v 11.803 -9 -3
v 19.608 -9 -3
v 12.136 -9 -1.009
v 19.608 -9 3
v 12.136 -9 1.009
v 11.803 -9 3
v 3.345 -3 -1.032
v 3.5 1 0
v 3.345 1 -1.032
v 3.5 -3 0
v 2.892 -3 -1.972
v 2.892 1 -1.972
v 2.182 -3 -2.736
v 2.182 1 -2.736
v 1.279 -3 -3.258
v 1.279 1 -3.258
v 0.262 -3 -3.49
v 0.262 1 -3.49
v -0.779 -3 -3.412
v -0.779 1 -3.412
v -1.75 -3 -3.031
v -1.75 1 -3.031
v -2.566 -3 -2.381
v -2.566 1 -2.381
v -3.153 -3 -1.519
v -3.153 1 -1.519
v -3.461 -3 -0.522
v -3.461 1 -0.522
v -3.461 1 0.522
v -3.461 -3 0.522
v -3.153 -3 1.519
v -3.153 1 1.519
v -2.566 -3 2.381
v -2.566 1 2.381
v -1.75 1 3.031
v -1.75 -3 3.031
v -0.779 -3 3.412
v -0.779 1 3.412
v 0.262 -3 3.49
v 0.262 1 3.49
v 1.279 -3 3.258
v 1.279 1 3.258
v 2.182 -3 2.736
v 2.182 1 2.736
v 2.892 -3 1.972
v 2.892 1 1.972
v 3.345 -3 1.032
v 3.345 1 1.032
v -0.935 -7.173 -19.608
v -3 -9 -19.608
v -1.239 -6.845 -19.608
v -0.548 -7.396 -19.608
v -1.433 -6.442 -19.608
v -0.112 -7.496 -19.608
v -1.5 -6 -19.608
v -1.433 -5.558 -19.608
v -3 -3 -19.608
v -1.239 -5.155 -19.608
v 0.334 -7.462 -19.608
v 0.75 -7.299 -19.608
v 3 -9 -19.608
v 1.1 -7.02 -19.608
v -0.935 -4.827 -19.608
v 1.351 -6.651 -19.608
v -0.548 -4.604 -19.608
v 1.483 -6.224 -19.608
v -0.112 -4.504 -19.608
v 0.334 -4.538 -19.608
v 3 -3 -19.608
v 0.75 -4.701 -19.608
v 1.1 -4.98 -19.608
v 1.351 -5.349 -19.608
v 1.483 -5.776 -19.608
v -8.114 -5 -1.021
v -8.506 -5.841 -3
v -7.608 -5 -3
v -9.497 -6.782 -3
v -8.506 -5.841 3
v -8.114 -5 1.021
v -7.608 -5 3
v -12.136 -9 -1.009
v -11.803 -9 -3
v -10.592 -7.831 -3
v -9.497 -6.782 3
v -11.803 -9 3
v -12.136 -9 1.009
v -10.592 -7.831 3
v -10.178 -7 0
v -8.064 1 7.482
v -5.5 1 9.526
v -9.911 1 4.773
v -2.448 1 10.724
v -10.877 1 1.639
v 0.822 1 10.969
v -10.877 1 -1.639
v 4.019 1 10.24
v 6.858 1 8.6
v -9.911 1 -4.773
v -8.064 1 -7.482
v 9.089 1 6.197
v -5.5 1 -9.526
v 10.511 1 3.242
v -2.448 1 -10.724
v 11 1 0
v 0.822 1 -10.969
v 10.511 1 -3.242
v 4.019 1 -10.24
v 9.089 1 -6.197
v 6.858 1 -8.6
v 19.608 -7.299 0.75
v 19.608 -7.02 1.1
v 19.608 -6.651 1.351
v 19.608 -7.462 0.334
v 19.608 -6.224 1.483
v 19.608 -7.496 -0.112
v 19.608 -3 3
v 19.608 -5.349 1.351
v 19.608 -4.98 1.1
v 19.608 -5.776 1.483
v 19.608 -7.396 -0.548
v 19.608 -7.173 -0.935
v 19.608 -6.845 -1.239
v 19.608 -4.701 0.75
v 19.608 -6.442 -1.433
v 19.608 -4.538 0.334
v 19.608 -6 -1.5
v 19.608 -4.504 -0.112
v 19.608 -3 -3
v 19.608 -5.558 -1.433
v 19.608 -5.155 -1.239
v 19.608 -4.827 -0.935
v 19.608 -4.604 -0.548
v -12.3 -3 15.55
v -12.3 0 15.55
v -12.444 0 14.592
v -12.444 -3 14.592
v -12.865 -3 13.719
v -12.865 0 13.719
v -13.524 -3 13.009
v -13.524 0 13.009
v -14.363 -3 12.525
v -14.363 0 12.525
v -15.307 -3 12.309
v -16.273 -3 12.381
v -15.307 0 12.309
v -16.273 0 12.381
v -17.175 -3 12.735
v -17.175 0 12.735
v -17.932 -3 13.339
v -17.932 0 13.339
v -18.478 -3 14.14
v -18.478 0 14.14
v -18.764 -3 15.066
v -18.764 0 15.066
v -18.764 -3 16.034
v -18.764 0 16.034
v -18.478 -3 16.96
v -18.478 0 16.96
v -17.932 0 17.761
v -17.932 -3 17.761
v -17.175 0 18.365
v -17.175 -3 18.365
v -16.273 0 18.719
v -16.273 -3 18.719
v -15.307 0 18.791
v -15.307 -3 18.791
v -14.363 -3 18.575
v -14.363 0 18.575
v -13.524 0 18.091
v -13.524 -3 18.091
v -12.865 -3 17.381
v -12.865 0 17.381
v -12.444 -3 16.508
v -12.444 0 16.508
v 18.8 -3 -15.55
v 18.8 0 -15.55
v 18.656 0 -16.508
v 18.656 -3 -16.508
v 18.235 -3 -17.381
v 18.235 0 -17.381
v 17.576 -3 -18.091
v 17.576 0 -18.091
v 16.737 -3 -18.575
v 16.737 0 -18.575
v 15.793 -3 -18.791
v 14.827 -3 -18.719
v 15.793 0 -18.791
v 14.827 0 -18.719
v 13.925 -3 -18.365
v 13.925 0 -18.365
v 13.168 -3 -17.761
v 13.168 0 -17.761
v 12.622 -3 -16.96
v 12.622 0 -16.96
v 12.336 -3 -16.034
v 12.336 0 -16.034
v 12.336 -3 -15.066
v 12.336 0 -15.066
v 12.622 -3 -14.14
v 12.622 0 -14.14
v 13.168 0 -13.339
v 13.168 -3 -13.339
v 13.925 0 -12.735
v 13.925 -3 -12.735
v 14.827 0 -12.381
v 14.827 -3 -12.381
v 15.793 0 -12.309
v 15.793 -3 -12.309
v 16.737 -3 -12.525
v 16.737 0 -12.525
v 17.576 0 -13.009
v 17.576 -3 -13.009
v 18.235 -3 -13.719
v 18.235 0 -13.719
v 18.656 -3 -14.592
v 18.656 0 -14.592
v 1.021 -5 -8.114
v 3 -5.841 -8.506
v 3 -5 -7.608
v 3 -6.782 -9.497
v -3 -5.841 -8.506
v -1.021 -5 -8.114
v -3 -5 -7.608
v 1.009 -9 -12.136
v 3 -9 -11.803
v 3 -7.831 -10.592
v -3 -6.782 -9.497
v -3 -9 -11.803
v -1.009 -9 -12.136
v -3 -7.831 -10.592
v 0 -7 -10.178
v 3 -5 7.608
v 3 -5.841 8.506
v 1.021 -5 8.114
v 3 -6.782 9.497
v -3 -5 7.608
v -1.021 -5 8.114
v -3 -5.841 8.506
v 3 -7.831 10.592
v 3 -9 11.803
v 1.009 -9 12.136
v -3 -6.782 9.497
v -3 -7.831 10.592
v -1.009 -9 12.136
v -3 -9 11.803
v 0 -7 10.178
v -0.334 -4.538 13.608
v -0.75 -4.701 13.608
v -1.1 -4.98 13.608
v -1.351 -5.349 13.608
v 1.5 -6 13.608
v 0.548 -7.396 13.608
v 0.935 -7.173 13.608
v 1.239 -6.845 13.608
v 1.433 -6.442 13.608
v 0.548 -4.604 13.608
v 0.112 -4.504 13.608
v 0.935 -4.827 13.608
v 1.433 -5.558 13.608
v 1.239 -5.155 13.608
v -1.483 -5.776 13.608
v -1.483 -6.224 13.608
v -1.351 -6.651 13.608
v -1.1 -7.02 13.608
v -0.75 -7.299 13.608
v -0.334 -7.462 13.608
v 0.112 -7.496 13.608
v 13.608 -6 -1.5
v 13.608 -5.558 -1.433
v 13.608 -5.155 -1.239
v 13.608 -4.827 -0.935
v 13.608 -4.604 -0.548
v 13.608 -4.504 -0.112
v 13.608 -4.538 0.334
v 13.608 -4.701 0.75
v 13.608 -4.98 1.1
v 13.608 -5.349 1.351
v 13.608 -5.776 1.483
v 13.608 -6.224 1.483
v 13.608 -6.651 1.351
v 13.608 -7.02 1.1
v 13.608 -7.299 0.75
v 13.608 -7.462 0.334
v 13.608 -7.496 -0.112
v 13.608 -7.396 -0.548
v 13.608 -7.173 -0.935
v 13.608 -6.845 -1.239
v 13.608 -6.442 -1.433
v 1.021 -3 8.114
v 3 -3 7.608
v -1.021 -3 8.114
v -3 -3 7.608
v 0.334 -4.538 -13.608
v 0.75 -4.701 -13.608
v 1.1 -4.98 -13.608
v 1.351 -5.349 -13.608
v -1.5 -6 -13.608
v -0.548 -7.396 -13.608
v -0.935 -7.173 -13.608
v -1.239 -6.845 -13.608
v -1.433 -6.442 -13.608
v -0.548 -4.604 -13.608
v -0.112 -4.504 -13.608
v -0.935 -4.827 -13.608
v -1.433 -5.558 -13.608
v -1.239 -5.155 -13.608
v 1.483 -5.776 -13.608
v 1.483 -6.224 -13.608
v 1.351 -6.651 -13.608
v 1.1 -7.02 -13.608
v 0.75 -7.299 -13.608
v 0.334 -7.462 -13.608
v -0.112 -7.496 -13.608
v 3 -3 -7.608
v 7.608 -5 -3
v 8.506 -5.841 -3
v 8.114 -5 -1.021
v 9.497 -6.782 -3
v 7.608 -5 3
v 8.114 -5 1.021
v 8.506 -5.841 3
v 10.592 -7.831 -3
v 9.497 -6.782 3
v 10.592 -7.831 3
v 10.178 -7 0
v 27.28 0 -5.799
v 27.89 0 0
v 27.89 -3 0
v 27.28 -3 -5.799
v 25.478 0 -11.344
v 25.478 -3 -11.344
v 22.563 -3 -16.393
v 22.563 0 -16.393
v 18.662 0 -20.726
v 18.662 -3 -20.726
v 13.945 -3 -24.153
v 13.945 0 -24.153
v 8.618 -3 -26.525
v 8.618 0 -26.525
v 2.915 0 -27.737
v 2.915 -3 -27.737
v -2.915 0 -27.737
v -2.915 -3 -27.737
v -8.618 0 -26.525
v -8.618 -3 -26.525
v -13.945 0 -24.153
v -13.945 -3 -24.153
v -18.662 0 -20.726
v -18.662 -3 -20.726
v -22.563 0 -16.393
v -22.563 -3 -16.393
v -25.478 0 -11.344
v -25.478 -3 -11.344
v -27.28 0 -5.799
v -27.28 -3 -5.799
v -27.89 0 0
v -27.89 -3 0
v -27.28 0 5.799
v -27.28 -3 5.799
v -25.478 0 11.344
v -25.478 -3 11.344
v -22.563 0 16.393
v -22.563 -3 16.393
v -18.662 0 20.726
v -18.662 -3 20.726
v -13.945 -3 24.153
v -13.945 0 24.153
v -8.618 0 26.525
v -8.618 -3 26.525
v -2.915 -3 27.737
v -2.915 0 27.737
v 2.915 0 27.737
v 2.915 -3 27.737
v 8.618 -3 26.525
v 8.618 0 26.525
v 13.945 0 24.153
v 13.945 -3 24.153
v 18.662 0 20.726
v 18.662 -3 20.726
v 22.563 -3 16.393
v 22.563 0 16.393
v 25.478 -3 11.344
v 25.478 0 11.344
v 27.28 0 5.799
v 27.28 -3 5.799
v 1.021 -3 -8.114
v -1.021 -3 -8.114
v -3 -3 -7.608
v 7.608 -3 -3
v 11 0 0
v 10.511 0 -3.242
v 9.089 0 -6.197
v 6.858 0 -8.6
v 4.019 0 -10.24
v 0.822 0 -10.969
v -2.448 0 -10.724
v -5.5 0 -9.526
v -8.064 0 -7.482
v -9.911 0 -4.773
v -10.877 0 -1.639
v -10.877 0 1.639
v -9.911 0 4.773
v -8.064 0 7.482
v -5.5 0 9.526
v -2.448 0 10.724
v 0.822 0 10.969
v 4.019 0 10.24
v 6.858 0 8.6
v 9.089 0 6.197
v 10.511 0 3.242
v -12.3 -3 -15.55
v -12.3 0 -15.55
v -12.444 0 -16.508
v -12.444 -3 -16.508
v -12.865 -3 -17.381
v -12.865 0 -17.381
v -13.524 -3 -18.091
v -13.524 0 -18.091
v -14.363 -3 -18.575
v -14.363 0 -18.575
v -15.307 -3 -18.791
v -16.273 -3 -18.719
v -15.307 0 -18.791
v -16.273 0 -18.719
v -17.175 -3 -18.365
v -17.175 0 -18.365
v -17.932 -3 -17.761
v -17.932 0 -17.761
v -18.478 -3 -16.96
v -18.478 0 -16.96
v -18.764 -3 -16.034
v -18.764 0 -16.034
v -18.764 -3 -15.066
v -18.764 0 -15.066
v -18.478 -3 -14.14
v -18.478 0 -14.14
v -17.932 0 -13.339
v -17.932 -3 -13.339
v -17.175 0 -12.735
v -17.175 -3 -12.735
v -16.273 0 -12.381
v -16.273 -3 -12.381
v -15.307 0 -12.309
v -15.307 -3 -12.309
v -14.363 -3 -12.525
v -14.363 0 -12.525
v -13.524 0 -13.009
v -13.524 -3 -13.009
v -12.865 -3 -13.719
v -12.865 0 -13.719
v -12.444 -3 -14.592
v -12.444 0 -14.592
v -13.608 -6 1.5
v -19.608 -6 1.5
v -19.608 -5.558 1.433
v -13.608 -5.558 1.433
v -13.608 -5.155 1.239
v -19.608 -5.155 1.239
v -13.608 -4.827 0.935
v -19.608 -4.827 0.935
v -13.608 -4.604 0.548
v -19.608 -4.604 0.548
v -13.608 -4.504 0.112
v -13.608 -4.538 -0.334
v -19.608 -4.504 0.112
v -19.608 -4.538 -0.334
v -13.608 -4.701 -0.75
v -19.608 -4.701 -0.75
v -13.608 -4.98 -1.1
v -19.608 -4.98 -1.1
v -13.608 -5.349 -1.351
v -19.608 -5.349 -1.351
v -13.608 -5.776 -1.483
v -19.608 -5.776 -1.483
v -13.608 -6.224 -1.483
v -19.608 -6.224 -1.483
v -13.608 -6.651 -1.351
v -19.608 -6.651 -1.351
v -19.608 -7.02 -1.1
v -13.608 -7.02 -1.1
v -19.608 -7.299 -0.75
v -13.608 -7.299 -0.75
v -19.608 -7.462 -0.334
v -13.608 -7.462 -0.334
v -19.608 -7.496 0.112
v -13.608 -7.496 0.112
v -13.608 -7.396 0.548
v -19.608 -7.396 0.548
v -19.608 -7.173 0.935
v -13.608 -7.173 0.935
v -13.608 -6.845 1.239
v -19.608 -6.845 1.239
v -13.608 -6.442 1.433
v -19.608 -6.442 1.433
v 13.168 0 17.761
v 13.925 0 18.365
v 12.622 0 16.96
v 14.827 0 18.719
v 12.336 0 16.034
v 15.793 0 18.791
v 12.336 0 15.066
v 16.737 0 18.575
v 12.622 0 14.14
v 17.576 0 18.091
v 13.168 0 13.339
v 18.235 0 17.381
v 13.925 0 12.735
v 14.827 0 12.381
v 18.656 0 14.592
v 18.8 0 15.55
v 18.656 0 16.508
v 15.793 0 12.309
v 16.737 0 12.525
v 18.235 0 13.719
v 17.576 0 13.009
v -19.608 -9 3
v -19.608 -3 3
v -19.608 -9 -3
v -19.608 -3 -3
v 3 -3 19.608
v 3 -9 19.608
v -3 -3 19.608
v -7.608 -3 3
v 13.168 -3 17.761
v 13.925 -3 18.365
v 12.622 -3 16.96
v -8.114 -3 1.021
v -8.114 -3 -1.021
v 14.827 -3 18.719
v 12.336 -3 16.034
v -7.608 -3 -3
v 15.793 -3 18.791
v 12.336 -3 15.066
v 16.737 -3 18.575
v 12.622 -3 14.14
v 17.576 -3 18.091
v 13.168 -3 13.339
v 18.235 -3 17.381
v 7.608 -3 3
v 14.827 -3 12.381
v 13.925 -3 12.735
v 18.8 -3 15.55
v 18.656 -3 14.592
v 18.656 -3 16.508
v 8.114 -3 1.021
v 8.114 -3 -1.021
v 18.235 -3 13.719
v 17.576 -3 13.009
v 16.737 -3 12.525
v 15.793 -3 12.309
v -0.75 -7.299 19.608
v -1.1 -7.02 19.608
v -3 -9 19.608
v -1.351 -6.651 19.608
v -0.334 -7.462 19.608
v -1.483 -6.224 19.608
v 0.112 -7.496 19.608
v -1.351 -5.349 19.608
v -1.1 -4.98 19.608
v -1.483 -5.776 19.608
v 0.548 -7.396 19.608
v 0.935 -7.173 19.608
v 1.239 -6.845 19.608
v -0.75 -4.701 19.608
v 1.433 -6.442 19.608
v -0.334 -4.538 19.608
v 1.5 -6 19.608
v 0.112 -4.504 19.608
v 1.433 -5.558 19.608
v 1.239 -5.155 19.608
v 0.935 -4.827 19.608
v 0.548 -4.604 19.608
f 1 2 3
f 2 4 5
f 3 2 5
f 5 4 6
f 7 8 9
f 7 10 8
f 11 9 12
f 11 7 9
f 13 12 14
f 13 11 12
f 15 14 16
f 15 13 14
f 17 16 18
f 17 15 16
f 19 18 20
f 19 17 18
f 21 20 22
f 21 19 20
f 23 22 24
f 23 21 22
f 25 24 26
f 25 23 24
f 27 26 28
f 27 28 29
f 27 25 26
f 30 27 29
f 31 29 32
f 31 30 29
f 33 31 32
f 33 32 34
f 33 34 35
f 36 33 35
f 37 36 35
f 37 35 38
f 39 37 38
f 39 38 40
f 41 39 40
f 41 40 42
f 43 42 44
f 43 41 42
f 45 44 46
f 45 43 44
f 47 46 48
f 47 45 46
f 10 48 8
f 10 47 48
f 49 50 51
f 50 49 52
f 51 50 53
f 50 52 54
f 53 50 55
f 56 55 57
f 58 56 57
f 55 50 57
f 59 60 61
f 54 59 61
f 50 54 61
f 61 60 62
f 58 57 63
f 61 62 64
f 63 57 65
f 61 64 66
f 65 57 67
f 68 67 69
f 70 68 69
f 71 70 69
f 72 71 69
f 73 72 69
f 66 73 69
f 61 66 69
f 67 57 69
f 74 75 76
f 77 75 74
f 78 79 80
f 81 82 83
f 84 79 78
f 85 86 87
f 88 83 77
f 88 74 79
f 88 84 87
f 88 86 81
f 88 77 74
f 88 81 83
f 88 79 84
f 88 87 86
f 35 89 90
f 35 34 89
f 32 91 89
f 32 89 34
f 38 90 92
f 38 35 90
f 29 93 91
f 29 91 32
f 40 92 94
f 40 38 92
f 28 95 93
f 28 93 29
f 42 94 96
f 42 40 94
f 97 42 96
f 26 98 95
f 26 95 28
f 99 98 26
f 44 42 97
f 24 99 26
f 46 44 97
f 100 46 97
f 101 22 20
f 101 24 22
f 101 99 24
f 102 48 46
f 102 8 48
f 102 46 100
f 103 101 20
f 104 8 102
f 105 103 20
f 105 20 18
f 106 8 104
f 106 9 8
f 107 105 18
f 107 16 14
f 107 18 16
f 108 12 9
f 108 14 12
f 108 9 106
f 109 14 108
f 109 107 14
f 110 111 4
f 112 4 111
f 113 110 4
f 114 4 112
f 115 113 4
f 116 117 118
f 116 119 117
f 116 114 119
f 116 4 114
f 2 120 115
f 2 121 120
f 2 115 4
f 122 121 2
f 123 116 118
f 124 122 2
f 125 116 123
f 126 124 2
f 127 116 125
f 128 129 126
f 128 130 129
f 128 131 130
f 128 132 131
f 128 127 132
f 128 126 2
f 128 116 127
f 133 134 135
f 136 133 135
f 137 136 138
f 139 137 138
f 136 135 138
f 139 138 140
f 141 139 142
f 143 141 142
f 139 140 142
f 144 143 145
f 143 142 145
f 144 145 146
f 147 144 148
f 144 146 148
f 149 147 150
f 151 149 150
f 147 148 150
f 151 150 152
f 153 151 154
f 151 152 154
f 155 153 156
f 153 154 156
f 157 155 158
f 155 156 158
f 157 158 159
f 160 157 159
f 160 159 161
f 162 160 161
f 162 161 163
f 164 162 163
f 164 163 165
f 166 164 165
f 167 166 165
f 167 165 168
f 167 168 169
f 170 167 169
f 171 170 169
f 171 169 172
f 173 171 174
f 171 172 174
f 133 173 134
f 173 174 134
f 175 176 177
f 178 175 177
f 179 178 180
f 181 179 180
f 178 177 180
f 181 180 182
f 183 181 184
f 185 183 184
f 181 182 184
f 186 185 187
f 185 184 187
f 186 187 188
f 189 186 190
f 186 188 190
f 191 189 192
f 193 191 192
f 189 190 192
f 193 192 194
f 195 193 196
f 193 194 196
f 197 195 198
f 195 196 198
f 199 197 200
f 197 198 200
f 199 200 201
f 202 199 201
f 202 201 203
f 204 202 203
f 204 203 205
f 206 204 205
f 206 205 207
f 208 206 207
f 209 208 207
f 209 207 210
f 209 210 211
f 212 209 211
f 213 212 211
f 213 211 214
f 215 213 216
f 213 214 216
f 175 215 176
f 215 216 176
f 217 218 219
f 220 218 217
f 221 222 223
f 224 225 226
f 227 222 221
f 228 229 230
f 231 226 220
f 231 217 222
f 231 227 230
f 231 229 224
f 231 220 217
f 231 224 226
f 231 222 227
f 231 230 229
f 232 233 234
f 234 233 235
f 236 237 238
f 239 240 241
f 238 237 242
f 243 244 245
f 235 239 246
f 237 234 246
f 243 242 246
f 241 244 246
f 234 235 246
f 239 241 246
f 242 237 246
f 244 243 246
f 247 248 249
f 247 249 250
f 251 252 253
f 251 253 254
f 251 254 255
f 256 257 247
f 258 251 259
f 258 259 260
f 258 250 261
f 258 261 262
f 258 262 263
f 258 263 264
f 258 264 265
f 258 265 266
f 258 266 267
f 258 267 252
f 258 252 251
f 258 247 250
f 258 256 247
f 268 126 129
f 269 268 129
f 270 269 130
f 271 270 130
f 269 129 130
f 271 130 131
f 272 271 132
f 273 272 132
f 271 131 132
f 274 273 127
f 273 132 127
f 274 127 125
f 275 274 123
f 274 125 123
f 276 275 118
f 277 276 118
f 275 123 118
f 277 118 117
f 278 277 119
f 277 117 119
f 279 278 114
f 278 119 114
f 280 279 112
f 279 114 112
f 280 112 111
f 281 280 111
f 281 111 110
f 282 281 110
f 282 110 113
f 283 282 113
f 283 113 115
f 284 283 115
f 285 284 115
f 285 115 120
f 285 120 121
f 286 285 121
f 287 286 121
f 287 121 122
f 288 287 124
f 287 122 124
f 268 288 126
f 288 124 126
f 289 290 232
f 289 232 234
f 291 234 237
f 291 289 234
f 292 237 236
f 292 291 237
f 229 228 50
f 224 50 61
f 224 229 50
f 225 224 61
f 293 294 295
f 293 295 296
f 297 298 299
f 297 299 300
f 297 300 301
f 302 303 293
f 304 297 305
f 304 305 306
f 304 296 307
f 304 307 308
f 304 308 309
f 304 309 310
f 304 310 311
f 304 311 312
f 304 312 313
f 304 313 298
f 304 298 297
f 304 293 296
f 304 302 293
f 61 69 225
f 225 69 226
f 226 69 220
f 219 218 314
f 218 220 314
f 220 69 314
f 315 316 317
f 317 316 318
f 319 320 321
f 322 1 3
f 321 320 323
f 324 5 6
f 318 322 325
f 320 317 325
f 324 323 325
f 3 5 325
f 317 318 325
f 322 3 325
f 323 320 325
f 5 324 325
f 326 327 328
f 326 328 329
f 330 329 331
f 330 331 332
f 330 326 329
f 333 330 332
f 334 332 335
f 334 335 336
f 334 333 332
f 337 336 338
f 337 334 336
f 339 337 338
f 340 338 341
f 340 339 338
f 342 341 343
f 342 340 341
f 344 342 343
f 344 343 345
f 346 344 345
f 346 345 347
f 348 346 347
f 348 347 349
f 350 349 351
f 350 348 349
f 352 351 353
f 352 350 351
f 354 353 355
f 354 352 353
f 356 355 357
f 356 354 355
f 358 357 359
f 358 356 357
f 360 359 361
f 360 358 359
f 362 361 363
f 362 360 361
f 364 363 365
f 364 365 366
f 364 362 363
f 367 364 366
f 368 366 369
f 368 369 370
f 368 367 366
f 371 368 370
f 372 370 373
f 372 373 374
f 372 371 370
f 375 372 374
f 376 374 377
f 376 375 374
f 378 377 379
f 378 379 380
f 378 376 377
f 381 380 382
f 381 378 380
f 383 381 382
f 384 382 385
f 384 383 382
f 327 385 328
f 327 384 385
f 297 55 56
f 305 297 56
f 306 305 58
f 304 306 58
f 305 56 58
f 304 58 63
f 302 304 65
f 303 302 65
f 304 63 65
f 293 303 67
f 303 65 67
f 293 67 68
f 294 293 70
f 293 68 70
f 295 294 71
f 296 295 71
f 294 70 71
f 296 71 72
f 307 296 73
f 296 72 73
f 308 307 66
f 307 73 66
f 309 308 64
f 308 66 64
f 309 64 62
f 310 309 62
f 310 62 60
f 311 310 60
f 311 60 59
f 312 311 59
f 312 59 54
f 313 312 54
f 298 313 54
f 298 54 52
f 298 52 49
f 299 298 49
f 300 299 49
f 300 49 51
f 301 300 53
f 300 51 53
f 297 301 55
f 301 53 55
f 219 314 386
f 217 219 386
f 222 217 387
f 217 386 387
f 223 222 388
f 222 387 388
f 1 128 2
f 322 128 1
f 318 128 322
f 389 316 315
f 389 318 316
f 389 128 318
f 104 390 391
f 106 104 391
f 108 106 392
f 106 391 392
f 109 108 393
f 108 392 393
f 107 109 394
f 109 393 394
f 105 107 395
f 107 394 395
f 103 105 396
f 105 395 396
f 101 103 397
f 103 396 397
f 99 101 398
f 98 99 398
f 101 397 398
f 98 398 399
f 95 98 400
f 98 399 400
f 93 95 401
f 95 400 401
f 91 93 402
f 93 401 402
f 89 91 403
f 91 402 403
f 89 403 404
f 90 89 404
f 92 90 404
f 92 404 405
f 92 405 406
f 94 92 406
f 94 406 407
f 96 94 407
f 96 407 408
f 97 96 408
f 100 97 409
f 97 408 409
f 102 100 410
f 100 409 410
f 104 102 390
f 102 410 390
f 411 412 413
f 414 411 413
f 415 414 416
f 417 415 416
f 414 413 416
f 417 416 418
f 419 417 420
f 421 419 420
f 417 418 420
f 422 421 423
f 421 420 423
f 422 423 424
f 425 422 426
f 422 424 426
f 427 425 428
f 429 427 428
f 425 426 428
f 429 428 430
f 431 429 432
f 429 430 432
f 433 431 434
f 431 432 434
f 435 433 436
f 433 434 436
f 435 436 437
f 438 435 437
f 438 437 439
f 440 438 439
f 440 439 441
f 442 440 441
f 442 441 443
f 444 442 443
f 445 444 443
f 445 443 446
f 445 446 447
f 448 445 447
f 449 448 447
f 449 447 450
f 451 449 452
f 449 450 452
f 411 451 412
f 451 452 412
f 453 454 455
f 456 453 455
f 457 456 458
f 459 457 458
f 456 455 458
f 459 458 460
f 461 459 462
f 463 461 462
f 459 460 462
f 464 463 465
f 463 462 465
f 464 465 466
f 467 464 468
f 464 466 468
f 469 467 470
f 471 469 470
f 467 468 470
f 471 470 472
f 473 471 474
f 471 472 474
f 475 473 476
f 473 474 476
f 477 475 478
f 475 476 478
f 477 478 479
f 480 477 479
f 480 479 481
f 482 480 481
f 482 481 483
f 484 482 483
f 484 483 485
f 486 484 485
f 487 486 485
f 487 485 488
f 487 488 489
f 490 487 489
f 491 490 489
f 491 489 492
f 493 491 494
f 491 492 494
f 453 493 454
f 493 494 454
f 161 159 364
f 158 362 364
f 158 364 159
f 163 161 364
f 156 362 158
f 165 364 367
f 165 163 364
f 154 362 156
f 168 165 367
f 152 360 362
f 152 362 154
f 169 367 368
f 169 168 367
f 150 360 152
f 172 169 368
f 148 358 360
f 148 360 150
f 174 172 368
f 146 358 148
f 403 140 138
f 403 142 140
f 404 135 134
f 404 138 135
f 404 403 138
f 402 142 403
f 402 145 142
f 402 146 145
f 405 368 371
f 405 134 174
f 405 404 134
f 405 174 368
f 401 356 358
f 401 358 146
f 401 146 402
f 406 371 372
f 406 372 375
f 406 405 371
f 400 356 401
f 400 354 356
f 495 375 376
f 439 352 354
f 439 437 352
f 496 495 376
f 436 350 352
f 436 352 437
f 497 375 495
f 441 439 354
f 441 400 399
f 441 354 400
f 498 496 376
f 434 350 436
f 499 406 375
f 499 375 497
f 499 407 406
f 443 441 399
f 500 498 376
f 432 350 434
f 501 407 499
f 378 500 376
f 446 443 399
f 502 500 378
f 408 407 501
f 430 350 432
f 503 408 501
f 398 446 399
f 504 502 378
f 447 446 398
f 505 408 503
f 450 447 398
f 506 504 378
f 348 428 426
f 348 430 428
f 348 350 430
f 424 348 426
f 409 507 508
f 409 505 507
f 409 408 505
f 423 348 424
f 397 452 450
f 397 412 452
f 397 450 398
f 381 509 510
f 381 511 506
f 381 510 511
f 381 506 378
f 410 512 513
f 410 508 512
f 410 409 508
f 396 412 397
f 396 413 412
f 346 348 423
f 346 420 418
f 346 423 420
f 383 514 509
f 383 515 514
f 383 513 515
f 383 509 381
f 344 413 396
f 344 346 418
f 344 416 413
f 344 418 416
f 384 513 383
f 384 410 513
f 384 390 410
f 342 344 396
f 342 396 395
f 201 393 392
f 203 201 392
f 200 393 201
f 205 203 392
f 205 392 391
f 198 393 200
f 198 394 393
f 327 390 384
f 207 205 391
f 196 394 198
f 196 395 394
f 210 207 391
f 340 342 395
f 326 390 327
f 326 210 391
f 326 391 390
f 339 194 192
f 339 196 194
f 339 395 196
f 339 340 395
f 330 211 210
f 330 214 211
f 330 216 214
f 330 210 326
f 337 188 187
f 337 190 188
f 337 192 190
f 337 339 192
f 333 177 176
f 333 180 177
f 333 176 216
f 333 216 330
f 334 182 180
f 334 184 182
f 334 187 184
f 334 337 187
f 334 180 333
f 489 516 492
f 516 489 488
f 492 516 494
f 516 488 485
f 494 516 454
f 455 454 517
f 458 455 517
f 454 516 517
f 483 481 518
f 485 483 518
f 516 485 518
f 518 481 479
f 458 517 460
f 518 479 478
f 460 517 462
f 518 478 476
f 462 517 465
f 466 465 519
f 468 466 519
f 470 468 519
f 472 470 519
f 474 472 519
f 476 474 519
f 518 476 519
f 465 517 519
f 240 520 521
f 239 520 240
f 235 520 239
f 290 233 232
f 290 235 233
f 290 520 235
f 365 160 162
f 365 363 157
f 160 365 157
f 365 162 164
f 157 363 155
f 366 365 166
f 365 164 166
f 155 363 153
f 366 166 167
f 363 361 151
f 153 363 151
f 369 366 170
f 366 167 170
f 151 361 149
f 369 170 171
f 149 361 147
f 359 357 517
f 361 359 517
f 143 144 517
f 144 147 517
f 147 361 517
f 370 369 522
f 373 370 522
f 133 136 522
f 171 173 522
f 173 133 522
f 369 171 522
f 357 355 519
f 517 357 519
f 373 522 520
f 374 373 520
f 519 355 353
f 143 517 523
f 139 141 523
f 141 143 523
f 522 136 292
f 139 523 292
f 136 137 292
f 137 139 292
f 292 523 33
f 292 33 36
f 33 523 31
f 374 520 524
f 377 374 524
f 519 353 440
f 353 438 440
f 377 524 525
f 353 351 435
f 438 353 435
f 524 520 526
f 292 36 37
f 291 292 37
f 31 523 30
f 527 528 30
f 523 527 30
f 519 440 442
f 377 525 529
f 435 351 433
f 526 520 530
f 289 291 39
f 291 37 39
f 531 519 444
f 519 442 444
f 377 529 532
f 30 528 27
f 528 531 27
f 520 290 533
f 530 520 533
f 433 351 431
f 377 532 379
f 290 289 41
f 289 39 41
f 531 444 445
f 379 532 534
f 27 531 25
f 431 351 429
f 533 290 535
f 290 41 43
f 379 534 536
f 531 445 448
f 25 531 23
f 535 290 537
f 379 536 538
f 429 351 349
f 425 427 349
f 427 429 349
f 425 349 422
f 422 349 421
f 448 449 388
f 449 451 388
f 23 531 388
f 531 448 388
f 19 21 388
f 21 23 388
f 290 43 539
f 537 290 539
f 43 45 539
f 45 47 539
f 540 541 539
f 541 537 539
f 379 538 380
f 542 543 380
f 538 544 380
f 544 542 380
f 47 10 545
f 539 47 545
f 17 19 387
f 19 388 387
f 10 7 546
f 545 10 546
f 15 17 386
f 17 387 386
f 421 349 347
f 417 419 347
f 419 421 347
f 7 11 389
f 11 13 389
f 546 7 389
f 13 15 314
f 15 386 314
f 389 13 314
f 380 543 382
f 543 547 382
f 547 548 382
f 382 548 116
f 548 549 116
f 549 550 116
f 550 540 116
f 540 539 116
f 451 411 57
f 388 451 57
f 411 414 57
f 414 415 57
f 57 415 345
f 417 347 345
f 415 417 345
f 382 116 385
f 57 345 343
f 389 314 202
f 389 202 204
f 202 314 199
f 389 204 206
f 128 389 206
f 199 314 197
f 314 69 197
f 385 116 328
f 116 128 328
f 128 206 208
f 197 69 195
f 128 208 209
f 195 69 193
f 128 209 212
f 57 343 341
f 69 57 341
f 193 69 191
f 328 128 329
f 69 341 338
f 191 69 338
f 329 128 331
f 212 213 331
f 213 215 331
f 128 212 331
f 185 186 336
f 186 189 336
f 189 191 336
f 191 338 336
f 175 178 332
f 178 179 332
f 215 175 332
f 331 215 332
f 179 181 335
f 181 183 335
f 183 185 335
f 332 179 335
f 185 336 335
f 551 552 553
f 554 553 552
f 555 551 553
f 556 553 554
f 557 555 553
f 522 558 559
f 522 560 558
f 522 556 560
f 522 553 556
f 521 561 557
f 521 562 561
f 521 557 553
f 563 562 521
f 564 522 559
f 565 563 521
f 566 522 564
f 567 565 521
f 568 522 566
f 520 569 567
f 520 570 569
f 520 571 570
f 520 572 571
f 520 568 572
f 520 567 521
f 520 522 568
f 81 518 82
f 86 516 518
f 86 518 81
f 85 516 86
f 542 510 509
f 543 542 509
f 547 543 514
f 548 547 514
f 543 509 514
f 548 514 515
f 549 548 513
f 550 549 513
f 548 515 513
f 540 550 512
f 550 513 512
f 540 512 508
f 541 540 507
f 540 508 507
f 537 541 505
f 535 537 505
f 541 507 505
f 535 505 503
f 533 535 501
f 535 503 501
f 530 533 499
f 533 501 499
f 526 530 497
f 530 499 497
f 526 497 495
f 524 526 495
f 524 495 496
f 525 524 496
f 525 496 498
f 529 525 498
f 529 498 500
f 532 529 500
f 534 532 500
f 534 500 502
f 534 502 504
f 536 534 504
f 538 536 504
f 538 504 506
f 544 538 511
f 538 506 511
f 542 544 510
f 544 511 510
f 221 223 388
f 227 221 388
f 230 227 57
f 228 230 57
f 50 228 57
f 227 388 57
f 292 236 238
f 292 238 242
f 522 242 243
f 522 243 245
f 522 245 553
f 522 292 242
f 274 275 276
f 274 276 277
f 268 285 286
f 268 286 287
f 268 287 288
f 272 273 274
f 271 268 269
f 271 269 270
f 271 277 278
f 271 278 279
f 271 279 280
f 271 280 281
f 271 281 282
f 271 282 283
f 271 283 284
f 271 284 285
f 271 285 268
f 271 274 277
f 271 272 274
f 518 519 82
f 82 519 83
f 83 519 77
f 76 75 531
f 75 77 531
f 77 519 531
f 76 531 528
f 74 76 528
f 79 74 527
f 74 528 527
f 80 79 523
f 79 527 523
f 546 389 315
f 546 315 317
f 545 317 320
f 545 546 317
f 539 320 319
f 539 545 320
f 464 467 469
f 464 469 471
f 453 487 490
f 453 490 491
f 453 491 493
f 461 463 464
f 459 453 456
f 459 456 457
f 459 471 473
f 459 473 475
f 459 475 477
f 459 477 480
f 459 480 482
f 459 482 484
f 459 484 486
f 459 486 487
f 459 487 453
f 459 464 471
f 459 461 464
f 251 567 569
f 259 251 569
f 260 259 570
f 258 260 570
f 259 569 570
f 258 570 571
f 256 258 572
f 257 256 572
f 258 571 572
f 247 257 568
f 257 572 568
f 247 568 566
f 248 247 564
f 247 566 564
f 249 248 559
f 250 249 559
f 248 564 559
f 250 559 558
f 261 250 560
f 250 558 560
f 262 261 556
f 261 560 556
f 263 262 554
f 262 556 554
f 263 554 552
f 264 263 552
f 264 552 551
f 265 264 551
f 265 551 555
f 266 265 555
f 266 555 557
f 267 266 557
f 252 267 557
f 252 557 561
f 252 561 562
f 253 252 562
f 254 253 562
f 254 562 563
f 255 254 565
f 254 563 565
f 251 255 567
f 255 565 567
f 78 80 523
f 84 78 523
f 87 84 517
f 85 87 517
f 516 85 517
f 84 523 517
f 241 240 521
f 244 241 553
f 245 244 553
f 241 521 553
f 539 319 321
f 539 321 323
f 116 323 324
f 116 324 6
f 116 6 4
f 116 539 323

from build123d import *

# Parameters (mm, degrees)
SKETCH1_R           = 27.889608224
SKETCH1_R_2         = 3.5
SKETCH1_R_3         = 3.25
BOSS_EXTRUDE1_DEPTH = 3
BOSS_EXTRUDE2_START = 1
SKETCH1_5_R         = 11
SKETCH1_5_R_2       = 3.5
BOSS_EXTRUDE2_DEPTH = 1
BOSS_EXTRUDE3_DEPTH = 6
CHAMFER1_SIZE       = 4
SKETCH3_R           = 1.5
CUT_EXTRUDE1_DEPTH  = 6
CIRPATTERN1_COUNT   = 4


with BuildPart() as part:
    # Sketch1 → Boss-Extrude1 (new body)
    with BuildSketch(Plane(origin=(0, 0, 0), x_dir=(1, 0, 0), z_dir=(0, 1, 0))):
        Circle(SKETCH1_R)
        Circle(SKETCH1_R_2, mode=Mode.SUBTRACT)
        with Locations((-15.55, -15.55)):
            Circle(SKETCH1_R_3, mode=Mode.SUBTRACT)
        with Locations((15.55, -15.55)):
            Circle(SKETCH1_R_3, mode=Mode.SUBTRACT)
        with Locations((-15.55, 15.55)):
            Circle(SKETCH1_R_3, mode=Mode.SUBTRACT)
        with Locations((15.55, 15.55)):
            Circle(SKETCH1_R_3, mode=Mode.SUBTRACT)
    extrude(amount=-BOSS_EXTRUDE1_DEPTH)

    # Sketch1<5> → Boss-Extrude2 (add)
    with BuildSketch(Plane(origin=(0, 0, 0), x_dir=(1, 0, 0), z_dir=(0, 1, 0)).offset(BOSS_EXTRUDE2_START)):
        Circle(SKETCH1_5_R)
        Circle(SKETCH1_5_R_2, mode=Mode.SUBTRACT)
    extrude(amount=-BOSS_EXTRUDE2_DEPTH)

    # Sketch2 → Boss-Extrude3 (add)
    with BuildSketch(Plane.XZ.offset(3)):
        with BuildLine():
            Line((-19.607997757, -3), (-7.607997757, -3))
            ThreePointArc((-7.607997757, -3), (-8.178118969, 0), (-7.607997757, 3))
            Line((-7.607997757, 3), (-19.607997757, 3))
            Line((-19.607997757, 3), (-19.607997757, -3))
        make_face()
        with BuildLine():
            Line((-3, 19.607997757), (3, 19.607997757))
            Line((3, 19.607997757), (3, 7.607997757))
            ThreePointArc((3, 7.607997757), (0, 8.178118969), (-3, 7.607997757))
            Line((-3, 7.607997757), (-3, 19.607997757))
        make_face()
        with BuildLine():
            Line((19.607997757, -3), (7.607997757, -3))
            ThreePointArc((7.607997757, -3), (8.178118969, 0), (7.607997757, 3))
            Line((7.607997757, 3), (19.607997757, 3))
            Line((19.607997757, 3), (19.607997757, -3))
        make_face()
        with BuildLine():
            Line((-3, -19.607997757), (3, -19.607997757))
            Line((3, -19.607997757), (3, -7.607997757))
            ThreePointArc((3, -7.607997757), (0, -8.178118969), (-3, -7.607997757))
            Line((-3, -7.607997757), (-3, -19.607997757))
        make_face()
    extrude(amount=BOSS_EXTRUDE3_DEPTH)

    # Chamfer1
    chamfer1_edges = [part.edges().sort_by_distance(p)[0] for p in [
        (-8.178118969, -9, 0),
        (0, -9, 8.178118969),
        (8.178118969, -9, 0),
        (0, -9, -8.178118969),
    ]]
    chamfer(chamfer1_edges, length=CHAMFER1_SIZE)

    # Sketch3 → Cut-Extrude1 (cut)
    with BuildSketch(Plane.ZY.offset(19.607997757)):
        with Locations((0, -6)):
            Circle(SKETCH3_R)
    cut_extrude1 = extrude(amount=-CUT_EXTRUDE1_DEPTH, mode=Mode.SUBTRACT)

    # CirPattern1: Cut-Extrude1 ×4 about axis
    cirpattern1_axis = Axis((0, -3, 0), (0, 1, 0))
    for i in range(1, CIRPATTERN1_COUNT):
        add(cut_extrude1.rotate(cirpattern1_axis, i * 360 / CIRPATTERN1_COUNT), mode=Mode.SUBTRACT)


solid = part.part
